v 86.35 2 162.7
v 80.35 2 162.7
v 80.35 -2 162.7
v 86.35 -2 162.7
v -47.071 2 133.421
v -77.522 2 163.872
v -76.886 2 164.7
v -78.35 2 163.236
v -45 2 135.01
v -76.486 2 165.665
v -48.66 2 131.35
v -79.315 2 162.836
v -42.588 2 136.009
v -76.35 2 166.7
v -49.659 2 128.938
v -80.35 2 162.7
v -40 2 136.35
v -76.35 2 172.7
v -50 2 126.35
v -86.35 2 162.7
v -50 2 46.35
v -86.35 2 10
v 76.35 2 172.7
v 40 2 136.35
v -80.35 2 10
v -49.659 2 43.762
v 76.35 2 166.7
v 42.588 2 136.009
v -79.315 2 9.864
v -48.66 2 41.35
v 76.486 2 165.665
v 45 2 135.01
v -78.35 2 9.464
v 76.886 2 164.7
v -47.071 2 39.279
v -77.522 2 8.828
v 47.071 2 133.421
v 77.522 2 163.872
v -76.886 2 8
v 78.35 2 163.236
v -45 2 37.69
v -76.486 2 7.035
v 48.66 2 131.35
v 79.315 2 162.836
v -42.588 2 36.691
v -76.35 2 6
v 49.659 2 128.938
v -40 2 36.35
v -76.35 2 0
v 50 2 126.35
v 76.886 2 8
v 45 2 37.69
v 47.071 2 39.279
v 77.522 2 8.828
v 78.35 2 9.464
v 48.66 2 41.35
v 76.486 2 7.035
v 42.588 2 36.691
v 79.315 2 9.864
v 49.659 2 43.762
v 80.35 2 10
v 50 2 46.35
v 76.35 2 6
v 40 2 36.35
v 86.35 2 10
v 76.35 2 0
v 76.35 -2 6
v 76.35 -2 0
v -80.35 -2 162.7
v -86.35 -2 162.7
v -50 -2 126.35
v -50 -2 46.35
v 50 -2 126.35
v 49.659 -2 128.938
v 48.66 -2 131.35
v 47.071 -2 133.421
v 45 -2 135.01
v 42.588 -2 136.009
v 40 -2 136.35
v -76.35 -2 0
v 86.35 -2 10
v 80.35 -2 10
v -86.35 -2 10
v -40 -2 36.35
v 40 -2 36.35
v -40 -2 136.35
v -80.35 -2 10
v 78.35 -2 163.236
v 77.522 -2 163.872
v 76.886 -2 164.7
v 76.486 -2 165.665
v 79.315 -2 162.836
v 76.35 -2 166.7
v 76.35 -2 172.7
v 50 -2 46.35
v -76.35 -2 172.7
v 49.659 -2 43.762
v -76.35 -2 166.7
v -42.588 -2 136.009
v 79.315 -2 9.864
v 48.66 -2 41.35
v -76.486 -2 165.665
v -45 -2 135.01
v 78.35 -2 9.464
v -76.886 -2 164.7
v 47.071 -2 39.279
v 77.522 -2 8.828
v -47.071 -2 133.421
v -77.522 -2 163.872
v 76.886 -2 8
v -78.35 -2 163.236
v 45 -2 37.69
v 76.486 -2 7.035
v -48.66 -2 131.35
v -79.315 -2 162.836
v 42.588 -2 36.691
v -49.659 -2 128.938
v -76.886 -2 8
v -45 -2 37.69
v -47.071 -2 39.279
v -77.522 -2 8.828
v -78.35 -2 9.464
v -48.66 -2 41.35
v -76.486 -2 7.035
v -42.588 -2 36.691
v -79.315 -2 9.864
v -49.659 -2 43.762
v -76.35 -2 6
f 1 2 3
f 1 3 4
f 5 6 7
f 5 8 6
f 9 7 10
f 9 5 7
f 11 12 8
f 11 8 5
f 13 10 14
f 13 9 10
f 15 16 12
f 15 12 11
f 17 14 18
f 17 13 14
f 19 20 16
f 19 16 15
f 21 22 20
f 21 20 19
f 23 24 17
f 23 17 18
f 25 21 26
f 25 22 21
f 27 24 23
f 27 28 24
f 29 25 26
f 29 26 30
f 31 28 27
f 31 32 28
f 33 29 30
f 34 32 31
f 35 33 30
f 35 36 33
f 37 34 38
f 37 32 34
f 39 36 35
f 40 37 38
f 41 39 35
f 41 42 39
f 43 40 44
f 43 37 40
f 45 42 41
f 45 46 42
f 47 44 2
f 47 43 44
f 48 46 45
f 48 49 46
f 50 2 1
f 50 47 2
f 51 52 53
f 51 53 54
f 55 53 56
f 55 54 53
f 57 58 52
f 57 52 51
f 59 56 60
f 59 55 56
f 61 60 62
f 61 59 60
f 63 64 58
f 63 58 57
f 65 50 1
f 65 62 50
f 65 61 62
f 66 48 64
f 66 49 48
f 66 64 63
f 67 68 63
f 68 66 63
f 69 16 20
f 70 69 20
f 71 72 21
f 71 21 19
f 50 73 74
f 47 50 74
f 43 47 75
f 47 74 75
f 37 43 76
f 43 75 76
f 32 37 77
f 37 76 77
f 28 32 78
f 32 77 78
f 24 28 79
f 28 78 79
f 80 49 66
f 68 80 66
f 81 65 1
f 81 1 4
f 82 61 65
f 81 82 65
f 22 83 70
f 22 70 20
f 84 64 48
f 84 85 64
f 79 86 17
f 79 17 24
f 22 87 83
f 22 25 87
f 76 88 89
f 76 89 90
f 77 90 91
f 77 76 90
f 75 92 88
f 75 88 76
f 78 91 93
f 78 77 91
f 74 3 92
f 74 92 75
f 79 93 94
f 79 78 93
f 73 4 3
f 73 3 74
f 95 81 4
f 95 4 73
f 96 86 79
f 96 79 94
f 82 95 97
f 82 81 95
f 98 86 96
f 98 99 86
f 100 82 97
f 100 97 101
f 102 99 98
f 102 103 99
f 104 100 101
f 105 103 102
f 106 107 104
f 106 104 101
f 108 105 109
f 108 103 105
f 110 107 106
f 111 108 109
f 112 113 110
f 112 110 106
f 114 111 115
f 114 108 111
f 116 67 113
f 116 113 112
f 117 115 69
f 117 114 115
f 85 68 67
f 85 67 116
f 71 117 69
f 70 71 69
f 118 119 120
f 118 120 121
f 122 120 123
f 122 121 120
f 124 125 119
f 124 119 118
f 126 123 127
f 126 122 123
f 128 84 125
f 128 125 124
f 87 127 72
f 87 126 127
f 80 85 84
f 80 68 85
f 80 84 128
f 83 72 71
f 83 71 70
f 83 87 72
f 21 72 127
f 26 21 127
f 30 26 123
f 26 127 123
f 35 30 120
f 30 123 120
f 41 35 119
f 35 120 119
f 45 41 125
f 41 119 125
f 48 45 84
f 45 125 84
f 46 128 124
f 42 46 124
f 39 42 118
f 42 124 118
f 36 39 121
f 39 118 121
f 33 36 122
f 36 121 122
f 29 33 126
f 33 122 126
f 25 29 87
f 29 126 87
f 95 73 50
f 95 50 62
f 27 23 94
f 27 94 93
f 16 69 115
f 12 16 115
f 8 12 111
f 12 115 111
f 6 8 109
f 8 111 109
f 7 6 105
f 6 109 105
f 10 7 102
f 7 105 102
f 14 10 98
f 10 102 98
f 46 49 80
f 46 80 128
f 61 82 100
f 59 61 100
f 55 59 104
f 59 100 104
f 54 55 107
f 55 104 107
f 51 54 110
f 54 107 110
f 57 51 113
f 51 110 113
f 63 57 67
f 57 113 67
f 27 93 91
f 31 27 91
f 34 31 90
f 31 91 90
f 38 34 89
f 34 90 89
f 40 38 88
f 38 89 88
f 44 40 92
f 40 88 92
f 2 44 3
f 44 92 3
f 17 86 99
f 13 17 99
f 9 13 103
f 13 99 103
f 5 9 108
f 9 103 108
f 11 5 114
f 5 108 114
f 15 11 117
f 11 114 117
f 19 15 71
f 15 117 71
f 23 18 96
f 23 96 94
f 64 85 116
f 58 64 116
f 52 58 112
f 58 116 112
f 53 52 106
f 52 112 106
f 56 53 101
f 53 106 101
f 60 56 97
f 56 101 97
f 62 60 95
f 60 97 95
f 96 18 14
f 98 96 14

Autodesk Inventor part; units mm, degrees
ref_plane "YZ Plane" through (0, 0, 0) normal (1, 0, 0) x (0, 1, 0)
ref_plane "XZ Plane" through (0, 0, 0) normal (0, 1, 0) x (-1, 0, 0)
ref_plane "XY Plane" through (0, 0, 0) normal (0, 0, 1) x (1, 0, 0)
sketch "Skizze1" plane through (0, 0, 0) normal (0, 0, 1) x (1, 0, 0)
  line L0 (-86.35, 2) -> (86.35, 2)
  line L1 (86.35, 2) -> (86.35, -2)
  line L2 (86.35, -2) -> (-86.35, -2)
  line L3 (-86.35, -2) -> (-86.35, 2)
  line L4 (-86.35, 2) -> (86.35, -2) construction
  line L5 (86.35, 2) -> (-86.35, -2) construction
  point P0 (0, 0)
  dimension "d0" = 4
  dimension "d1" = 172.7
extrude "Extrusion1" add sketch "Skizze1" along normal blind 172.7
sketch "Skizze2" plane through (-86.35, -2, 0) normal (0, -1, 0) x (1, 0, 0)
  line L0 (172.7, 0) -> (172.7, 172.7) projected
  line L1 (46.35, 136.35) -> (126.35, 136.35)
  line L2 (136.35, 126.35) -> (136.35, 46.35)
  line L3 (126.35, 36.35) -> (46.35, 36.35)
  line L4 (36.35, 46.35) -> (36.35, 126.35)
  line L5 (172.7, 0) -> (0, 0) projected
  line L6 (0, 0) -> (0, 172.7) projected
  line L7 (172.7, 172.7) -> (0, 172.7) projected
  arc A0 (46.35, 136.35) -> (36.35, 126.35) centre (46.35, 126.35) ccw
  arc A1 (36.35, 46.35) -> (46.35, 36.35) centre (46.35, 46.35) ccw
  arc A2 (126.35, 36.35) -> (136.35, 46.35) centre (126.35, 46.35) ccw
  arc A3 (136.35, 126.35) -> (126.35, 136.35) centre (126.35, 126.35) ccw
  point P0 (86.35, 0)
  point P1 (36.35, 136.35)
  point P2 (136.35, 136.35)
  point P3 (36.35, 36.35)
  dimension "d50" = 100
  dimension "d51" = 100
  dimension "d52" = 36.35
  dimension "d53" = 36.35
  dimension "d54" = 36.35
  dimension "d55" = 36.35
  dimension "d56" = 10
extrude "Extrusion2" cut sketch "Skizze2" against normal blind 10 contours L1 A3 L2 A2 L3 A1 L4 A0
sketch "Skizze3" plane through (-86.35, 2, 0) normal (0, 1, 0) x (1, 0, 0)
  line L0 (114.5855, -0.5055) -> (156.5746, -0.5055) construction
  line L1 (156.5746, -0.5055) -> (156.5746, -42.4946) construction
  line L2 (156.5746, -42.4946) -> (114.5855, -42.4946) construction
  line L3 (114.5855, -42.4946) -> (114.5855, -0.5055) construction
  point P0 (86.35, 0)
  dimension "d1" = 172.7
sketch "Skizze4" plane through (-86.35, 2, 0) normal (0, 1, 0) x (1, 0, 0)
  line L0 (0, -172.7) -> (172.7, -172.7) projected
  line L1 (0, -172.7) -> (10, -172.7)
  line L2 (10, -172.7) -> (10, -162.7)
  line L3 (10, -162.7) -> (0, -162.7)
  line L4 (0, -162.7) -> (0, -172.7)
  line L5 (0, 0) -> (0, -172.7) projected
  line L6 (0, 0) -> (10, 0)
  line L7 (10, 0) -> (10, -10)
  line L8 (10, -10) -> (0, -10)
  line L9 (0, -10) -> (0, 0)
  line L10 (172.7, 0) -> (162.7, 0)
  line L11 (162.7, 0) -> (162.7, -10)
  line L12 (162.7, -10) -> (172.7, -10)
  line L13 (172.7, -10) -> (172.7, 0)
  line L14 (172.7, 0) -> (172.7, -172.7) projected
  line L15 (172.7, -172.7) -> (162.7, -172.7)
  line L16 (162.7, -172.7) -> (162.7, -162.7)
  line L17 (162.7, -162.7) -> (172.7, -162.7)
  line L18 (172.7, -162.7) -> (172.7, -172.7)
  line L19 (172.7, 0) -> (0, 0) projected
  point P0 (86.35, 0)
  point P1 (0, -10)
  dimension "d57" = 10
  dimension "d58" = 10
  dimension "d59" = 10
  dimension "d60" = 10
  dimension "d61" = 10
  dimension "d62" = 10
  dimension "d63" = 10
extrude "Extrusion3" cut sketch "Skizze4" against normal blind 10 contours L4 L3 L2 L0 | L16 L17 L14 L0 | L5 L6 L7 L8 | L12 L11 L10 L13
fillet "Rundung1" radius 4 4 edges at (76.35, 0, 162.7) (76.35, 0, 10) (-76.35, 0, 10) (-76.35, 0, 162.7)
properties part number "Schutzglas_oben" material "Glas"
